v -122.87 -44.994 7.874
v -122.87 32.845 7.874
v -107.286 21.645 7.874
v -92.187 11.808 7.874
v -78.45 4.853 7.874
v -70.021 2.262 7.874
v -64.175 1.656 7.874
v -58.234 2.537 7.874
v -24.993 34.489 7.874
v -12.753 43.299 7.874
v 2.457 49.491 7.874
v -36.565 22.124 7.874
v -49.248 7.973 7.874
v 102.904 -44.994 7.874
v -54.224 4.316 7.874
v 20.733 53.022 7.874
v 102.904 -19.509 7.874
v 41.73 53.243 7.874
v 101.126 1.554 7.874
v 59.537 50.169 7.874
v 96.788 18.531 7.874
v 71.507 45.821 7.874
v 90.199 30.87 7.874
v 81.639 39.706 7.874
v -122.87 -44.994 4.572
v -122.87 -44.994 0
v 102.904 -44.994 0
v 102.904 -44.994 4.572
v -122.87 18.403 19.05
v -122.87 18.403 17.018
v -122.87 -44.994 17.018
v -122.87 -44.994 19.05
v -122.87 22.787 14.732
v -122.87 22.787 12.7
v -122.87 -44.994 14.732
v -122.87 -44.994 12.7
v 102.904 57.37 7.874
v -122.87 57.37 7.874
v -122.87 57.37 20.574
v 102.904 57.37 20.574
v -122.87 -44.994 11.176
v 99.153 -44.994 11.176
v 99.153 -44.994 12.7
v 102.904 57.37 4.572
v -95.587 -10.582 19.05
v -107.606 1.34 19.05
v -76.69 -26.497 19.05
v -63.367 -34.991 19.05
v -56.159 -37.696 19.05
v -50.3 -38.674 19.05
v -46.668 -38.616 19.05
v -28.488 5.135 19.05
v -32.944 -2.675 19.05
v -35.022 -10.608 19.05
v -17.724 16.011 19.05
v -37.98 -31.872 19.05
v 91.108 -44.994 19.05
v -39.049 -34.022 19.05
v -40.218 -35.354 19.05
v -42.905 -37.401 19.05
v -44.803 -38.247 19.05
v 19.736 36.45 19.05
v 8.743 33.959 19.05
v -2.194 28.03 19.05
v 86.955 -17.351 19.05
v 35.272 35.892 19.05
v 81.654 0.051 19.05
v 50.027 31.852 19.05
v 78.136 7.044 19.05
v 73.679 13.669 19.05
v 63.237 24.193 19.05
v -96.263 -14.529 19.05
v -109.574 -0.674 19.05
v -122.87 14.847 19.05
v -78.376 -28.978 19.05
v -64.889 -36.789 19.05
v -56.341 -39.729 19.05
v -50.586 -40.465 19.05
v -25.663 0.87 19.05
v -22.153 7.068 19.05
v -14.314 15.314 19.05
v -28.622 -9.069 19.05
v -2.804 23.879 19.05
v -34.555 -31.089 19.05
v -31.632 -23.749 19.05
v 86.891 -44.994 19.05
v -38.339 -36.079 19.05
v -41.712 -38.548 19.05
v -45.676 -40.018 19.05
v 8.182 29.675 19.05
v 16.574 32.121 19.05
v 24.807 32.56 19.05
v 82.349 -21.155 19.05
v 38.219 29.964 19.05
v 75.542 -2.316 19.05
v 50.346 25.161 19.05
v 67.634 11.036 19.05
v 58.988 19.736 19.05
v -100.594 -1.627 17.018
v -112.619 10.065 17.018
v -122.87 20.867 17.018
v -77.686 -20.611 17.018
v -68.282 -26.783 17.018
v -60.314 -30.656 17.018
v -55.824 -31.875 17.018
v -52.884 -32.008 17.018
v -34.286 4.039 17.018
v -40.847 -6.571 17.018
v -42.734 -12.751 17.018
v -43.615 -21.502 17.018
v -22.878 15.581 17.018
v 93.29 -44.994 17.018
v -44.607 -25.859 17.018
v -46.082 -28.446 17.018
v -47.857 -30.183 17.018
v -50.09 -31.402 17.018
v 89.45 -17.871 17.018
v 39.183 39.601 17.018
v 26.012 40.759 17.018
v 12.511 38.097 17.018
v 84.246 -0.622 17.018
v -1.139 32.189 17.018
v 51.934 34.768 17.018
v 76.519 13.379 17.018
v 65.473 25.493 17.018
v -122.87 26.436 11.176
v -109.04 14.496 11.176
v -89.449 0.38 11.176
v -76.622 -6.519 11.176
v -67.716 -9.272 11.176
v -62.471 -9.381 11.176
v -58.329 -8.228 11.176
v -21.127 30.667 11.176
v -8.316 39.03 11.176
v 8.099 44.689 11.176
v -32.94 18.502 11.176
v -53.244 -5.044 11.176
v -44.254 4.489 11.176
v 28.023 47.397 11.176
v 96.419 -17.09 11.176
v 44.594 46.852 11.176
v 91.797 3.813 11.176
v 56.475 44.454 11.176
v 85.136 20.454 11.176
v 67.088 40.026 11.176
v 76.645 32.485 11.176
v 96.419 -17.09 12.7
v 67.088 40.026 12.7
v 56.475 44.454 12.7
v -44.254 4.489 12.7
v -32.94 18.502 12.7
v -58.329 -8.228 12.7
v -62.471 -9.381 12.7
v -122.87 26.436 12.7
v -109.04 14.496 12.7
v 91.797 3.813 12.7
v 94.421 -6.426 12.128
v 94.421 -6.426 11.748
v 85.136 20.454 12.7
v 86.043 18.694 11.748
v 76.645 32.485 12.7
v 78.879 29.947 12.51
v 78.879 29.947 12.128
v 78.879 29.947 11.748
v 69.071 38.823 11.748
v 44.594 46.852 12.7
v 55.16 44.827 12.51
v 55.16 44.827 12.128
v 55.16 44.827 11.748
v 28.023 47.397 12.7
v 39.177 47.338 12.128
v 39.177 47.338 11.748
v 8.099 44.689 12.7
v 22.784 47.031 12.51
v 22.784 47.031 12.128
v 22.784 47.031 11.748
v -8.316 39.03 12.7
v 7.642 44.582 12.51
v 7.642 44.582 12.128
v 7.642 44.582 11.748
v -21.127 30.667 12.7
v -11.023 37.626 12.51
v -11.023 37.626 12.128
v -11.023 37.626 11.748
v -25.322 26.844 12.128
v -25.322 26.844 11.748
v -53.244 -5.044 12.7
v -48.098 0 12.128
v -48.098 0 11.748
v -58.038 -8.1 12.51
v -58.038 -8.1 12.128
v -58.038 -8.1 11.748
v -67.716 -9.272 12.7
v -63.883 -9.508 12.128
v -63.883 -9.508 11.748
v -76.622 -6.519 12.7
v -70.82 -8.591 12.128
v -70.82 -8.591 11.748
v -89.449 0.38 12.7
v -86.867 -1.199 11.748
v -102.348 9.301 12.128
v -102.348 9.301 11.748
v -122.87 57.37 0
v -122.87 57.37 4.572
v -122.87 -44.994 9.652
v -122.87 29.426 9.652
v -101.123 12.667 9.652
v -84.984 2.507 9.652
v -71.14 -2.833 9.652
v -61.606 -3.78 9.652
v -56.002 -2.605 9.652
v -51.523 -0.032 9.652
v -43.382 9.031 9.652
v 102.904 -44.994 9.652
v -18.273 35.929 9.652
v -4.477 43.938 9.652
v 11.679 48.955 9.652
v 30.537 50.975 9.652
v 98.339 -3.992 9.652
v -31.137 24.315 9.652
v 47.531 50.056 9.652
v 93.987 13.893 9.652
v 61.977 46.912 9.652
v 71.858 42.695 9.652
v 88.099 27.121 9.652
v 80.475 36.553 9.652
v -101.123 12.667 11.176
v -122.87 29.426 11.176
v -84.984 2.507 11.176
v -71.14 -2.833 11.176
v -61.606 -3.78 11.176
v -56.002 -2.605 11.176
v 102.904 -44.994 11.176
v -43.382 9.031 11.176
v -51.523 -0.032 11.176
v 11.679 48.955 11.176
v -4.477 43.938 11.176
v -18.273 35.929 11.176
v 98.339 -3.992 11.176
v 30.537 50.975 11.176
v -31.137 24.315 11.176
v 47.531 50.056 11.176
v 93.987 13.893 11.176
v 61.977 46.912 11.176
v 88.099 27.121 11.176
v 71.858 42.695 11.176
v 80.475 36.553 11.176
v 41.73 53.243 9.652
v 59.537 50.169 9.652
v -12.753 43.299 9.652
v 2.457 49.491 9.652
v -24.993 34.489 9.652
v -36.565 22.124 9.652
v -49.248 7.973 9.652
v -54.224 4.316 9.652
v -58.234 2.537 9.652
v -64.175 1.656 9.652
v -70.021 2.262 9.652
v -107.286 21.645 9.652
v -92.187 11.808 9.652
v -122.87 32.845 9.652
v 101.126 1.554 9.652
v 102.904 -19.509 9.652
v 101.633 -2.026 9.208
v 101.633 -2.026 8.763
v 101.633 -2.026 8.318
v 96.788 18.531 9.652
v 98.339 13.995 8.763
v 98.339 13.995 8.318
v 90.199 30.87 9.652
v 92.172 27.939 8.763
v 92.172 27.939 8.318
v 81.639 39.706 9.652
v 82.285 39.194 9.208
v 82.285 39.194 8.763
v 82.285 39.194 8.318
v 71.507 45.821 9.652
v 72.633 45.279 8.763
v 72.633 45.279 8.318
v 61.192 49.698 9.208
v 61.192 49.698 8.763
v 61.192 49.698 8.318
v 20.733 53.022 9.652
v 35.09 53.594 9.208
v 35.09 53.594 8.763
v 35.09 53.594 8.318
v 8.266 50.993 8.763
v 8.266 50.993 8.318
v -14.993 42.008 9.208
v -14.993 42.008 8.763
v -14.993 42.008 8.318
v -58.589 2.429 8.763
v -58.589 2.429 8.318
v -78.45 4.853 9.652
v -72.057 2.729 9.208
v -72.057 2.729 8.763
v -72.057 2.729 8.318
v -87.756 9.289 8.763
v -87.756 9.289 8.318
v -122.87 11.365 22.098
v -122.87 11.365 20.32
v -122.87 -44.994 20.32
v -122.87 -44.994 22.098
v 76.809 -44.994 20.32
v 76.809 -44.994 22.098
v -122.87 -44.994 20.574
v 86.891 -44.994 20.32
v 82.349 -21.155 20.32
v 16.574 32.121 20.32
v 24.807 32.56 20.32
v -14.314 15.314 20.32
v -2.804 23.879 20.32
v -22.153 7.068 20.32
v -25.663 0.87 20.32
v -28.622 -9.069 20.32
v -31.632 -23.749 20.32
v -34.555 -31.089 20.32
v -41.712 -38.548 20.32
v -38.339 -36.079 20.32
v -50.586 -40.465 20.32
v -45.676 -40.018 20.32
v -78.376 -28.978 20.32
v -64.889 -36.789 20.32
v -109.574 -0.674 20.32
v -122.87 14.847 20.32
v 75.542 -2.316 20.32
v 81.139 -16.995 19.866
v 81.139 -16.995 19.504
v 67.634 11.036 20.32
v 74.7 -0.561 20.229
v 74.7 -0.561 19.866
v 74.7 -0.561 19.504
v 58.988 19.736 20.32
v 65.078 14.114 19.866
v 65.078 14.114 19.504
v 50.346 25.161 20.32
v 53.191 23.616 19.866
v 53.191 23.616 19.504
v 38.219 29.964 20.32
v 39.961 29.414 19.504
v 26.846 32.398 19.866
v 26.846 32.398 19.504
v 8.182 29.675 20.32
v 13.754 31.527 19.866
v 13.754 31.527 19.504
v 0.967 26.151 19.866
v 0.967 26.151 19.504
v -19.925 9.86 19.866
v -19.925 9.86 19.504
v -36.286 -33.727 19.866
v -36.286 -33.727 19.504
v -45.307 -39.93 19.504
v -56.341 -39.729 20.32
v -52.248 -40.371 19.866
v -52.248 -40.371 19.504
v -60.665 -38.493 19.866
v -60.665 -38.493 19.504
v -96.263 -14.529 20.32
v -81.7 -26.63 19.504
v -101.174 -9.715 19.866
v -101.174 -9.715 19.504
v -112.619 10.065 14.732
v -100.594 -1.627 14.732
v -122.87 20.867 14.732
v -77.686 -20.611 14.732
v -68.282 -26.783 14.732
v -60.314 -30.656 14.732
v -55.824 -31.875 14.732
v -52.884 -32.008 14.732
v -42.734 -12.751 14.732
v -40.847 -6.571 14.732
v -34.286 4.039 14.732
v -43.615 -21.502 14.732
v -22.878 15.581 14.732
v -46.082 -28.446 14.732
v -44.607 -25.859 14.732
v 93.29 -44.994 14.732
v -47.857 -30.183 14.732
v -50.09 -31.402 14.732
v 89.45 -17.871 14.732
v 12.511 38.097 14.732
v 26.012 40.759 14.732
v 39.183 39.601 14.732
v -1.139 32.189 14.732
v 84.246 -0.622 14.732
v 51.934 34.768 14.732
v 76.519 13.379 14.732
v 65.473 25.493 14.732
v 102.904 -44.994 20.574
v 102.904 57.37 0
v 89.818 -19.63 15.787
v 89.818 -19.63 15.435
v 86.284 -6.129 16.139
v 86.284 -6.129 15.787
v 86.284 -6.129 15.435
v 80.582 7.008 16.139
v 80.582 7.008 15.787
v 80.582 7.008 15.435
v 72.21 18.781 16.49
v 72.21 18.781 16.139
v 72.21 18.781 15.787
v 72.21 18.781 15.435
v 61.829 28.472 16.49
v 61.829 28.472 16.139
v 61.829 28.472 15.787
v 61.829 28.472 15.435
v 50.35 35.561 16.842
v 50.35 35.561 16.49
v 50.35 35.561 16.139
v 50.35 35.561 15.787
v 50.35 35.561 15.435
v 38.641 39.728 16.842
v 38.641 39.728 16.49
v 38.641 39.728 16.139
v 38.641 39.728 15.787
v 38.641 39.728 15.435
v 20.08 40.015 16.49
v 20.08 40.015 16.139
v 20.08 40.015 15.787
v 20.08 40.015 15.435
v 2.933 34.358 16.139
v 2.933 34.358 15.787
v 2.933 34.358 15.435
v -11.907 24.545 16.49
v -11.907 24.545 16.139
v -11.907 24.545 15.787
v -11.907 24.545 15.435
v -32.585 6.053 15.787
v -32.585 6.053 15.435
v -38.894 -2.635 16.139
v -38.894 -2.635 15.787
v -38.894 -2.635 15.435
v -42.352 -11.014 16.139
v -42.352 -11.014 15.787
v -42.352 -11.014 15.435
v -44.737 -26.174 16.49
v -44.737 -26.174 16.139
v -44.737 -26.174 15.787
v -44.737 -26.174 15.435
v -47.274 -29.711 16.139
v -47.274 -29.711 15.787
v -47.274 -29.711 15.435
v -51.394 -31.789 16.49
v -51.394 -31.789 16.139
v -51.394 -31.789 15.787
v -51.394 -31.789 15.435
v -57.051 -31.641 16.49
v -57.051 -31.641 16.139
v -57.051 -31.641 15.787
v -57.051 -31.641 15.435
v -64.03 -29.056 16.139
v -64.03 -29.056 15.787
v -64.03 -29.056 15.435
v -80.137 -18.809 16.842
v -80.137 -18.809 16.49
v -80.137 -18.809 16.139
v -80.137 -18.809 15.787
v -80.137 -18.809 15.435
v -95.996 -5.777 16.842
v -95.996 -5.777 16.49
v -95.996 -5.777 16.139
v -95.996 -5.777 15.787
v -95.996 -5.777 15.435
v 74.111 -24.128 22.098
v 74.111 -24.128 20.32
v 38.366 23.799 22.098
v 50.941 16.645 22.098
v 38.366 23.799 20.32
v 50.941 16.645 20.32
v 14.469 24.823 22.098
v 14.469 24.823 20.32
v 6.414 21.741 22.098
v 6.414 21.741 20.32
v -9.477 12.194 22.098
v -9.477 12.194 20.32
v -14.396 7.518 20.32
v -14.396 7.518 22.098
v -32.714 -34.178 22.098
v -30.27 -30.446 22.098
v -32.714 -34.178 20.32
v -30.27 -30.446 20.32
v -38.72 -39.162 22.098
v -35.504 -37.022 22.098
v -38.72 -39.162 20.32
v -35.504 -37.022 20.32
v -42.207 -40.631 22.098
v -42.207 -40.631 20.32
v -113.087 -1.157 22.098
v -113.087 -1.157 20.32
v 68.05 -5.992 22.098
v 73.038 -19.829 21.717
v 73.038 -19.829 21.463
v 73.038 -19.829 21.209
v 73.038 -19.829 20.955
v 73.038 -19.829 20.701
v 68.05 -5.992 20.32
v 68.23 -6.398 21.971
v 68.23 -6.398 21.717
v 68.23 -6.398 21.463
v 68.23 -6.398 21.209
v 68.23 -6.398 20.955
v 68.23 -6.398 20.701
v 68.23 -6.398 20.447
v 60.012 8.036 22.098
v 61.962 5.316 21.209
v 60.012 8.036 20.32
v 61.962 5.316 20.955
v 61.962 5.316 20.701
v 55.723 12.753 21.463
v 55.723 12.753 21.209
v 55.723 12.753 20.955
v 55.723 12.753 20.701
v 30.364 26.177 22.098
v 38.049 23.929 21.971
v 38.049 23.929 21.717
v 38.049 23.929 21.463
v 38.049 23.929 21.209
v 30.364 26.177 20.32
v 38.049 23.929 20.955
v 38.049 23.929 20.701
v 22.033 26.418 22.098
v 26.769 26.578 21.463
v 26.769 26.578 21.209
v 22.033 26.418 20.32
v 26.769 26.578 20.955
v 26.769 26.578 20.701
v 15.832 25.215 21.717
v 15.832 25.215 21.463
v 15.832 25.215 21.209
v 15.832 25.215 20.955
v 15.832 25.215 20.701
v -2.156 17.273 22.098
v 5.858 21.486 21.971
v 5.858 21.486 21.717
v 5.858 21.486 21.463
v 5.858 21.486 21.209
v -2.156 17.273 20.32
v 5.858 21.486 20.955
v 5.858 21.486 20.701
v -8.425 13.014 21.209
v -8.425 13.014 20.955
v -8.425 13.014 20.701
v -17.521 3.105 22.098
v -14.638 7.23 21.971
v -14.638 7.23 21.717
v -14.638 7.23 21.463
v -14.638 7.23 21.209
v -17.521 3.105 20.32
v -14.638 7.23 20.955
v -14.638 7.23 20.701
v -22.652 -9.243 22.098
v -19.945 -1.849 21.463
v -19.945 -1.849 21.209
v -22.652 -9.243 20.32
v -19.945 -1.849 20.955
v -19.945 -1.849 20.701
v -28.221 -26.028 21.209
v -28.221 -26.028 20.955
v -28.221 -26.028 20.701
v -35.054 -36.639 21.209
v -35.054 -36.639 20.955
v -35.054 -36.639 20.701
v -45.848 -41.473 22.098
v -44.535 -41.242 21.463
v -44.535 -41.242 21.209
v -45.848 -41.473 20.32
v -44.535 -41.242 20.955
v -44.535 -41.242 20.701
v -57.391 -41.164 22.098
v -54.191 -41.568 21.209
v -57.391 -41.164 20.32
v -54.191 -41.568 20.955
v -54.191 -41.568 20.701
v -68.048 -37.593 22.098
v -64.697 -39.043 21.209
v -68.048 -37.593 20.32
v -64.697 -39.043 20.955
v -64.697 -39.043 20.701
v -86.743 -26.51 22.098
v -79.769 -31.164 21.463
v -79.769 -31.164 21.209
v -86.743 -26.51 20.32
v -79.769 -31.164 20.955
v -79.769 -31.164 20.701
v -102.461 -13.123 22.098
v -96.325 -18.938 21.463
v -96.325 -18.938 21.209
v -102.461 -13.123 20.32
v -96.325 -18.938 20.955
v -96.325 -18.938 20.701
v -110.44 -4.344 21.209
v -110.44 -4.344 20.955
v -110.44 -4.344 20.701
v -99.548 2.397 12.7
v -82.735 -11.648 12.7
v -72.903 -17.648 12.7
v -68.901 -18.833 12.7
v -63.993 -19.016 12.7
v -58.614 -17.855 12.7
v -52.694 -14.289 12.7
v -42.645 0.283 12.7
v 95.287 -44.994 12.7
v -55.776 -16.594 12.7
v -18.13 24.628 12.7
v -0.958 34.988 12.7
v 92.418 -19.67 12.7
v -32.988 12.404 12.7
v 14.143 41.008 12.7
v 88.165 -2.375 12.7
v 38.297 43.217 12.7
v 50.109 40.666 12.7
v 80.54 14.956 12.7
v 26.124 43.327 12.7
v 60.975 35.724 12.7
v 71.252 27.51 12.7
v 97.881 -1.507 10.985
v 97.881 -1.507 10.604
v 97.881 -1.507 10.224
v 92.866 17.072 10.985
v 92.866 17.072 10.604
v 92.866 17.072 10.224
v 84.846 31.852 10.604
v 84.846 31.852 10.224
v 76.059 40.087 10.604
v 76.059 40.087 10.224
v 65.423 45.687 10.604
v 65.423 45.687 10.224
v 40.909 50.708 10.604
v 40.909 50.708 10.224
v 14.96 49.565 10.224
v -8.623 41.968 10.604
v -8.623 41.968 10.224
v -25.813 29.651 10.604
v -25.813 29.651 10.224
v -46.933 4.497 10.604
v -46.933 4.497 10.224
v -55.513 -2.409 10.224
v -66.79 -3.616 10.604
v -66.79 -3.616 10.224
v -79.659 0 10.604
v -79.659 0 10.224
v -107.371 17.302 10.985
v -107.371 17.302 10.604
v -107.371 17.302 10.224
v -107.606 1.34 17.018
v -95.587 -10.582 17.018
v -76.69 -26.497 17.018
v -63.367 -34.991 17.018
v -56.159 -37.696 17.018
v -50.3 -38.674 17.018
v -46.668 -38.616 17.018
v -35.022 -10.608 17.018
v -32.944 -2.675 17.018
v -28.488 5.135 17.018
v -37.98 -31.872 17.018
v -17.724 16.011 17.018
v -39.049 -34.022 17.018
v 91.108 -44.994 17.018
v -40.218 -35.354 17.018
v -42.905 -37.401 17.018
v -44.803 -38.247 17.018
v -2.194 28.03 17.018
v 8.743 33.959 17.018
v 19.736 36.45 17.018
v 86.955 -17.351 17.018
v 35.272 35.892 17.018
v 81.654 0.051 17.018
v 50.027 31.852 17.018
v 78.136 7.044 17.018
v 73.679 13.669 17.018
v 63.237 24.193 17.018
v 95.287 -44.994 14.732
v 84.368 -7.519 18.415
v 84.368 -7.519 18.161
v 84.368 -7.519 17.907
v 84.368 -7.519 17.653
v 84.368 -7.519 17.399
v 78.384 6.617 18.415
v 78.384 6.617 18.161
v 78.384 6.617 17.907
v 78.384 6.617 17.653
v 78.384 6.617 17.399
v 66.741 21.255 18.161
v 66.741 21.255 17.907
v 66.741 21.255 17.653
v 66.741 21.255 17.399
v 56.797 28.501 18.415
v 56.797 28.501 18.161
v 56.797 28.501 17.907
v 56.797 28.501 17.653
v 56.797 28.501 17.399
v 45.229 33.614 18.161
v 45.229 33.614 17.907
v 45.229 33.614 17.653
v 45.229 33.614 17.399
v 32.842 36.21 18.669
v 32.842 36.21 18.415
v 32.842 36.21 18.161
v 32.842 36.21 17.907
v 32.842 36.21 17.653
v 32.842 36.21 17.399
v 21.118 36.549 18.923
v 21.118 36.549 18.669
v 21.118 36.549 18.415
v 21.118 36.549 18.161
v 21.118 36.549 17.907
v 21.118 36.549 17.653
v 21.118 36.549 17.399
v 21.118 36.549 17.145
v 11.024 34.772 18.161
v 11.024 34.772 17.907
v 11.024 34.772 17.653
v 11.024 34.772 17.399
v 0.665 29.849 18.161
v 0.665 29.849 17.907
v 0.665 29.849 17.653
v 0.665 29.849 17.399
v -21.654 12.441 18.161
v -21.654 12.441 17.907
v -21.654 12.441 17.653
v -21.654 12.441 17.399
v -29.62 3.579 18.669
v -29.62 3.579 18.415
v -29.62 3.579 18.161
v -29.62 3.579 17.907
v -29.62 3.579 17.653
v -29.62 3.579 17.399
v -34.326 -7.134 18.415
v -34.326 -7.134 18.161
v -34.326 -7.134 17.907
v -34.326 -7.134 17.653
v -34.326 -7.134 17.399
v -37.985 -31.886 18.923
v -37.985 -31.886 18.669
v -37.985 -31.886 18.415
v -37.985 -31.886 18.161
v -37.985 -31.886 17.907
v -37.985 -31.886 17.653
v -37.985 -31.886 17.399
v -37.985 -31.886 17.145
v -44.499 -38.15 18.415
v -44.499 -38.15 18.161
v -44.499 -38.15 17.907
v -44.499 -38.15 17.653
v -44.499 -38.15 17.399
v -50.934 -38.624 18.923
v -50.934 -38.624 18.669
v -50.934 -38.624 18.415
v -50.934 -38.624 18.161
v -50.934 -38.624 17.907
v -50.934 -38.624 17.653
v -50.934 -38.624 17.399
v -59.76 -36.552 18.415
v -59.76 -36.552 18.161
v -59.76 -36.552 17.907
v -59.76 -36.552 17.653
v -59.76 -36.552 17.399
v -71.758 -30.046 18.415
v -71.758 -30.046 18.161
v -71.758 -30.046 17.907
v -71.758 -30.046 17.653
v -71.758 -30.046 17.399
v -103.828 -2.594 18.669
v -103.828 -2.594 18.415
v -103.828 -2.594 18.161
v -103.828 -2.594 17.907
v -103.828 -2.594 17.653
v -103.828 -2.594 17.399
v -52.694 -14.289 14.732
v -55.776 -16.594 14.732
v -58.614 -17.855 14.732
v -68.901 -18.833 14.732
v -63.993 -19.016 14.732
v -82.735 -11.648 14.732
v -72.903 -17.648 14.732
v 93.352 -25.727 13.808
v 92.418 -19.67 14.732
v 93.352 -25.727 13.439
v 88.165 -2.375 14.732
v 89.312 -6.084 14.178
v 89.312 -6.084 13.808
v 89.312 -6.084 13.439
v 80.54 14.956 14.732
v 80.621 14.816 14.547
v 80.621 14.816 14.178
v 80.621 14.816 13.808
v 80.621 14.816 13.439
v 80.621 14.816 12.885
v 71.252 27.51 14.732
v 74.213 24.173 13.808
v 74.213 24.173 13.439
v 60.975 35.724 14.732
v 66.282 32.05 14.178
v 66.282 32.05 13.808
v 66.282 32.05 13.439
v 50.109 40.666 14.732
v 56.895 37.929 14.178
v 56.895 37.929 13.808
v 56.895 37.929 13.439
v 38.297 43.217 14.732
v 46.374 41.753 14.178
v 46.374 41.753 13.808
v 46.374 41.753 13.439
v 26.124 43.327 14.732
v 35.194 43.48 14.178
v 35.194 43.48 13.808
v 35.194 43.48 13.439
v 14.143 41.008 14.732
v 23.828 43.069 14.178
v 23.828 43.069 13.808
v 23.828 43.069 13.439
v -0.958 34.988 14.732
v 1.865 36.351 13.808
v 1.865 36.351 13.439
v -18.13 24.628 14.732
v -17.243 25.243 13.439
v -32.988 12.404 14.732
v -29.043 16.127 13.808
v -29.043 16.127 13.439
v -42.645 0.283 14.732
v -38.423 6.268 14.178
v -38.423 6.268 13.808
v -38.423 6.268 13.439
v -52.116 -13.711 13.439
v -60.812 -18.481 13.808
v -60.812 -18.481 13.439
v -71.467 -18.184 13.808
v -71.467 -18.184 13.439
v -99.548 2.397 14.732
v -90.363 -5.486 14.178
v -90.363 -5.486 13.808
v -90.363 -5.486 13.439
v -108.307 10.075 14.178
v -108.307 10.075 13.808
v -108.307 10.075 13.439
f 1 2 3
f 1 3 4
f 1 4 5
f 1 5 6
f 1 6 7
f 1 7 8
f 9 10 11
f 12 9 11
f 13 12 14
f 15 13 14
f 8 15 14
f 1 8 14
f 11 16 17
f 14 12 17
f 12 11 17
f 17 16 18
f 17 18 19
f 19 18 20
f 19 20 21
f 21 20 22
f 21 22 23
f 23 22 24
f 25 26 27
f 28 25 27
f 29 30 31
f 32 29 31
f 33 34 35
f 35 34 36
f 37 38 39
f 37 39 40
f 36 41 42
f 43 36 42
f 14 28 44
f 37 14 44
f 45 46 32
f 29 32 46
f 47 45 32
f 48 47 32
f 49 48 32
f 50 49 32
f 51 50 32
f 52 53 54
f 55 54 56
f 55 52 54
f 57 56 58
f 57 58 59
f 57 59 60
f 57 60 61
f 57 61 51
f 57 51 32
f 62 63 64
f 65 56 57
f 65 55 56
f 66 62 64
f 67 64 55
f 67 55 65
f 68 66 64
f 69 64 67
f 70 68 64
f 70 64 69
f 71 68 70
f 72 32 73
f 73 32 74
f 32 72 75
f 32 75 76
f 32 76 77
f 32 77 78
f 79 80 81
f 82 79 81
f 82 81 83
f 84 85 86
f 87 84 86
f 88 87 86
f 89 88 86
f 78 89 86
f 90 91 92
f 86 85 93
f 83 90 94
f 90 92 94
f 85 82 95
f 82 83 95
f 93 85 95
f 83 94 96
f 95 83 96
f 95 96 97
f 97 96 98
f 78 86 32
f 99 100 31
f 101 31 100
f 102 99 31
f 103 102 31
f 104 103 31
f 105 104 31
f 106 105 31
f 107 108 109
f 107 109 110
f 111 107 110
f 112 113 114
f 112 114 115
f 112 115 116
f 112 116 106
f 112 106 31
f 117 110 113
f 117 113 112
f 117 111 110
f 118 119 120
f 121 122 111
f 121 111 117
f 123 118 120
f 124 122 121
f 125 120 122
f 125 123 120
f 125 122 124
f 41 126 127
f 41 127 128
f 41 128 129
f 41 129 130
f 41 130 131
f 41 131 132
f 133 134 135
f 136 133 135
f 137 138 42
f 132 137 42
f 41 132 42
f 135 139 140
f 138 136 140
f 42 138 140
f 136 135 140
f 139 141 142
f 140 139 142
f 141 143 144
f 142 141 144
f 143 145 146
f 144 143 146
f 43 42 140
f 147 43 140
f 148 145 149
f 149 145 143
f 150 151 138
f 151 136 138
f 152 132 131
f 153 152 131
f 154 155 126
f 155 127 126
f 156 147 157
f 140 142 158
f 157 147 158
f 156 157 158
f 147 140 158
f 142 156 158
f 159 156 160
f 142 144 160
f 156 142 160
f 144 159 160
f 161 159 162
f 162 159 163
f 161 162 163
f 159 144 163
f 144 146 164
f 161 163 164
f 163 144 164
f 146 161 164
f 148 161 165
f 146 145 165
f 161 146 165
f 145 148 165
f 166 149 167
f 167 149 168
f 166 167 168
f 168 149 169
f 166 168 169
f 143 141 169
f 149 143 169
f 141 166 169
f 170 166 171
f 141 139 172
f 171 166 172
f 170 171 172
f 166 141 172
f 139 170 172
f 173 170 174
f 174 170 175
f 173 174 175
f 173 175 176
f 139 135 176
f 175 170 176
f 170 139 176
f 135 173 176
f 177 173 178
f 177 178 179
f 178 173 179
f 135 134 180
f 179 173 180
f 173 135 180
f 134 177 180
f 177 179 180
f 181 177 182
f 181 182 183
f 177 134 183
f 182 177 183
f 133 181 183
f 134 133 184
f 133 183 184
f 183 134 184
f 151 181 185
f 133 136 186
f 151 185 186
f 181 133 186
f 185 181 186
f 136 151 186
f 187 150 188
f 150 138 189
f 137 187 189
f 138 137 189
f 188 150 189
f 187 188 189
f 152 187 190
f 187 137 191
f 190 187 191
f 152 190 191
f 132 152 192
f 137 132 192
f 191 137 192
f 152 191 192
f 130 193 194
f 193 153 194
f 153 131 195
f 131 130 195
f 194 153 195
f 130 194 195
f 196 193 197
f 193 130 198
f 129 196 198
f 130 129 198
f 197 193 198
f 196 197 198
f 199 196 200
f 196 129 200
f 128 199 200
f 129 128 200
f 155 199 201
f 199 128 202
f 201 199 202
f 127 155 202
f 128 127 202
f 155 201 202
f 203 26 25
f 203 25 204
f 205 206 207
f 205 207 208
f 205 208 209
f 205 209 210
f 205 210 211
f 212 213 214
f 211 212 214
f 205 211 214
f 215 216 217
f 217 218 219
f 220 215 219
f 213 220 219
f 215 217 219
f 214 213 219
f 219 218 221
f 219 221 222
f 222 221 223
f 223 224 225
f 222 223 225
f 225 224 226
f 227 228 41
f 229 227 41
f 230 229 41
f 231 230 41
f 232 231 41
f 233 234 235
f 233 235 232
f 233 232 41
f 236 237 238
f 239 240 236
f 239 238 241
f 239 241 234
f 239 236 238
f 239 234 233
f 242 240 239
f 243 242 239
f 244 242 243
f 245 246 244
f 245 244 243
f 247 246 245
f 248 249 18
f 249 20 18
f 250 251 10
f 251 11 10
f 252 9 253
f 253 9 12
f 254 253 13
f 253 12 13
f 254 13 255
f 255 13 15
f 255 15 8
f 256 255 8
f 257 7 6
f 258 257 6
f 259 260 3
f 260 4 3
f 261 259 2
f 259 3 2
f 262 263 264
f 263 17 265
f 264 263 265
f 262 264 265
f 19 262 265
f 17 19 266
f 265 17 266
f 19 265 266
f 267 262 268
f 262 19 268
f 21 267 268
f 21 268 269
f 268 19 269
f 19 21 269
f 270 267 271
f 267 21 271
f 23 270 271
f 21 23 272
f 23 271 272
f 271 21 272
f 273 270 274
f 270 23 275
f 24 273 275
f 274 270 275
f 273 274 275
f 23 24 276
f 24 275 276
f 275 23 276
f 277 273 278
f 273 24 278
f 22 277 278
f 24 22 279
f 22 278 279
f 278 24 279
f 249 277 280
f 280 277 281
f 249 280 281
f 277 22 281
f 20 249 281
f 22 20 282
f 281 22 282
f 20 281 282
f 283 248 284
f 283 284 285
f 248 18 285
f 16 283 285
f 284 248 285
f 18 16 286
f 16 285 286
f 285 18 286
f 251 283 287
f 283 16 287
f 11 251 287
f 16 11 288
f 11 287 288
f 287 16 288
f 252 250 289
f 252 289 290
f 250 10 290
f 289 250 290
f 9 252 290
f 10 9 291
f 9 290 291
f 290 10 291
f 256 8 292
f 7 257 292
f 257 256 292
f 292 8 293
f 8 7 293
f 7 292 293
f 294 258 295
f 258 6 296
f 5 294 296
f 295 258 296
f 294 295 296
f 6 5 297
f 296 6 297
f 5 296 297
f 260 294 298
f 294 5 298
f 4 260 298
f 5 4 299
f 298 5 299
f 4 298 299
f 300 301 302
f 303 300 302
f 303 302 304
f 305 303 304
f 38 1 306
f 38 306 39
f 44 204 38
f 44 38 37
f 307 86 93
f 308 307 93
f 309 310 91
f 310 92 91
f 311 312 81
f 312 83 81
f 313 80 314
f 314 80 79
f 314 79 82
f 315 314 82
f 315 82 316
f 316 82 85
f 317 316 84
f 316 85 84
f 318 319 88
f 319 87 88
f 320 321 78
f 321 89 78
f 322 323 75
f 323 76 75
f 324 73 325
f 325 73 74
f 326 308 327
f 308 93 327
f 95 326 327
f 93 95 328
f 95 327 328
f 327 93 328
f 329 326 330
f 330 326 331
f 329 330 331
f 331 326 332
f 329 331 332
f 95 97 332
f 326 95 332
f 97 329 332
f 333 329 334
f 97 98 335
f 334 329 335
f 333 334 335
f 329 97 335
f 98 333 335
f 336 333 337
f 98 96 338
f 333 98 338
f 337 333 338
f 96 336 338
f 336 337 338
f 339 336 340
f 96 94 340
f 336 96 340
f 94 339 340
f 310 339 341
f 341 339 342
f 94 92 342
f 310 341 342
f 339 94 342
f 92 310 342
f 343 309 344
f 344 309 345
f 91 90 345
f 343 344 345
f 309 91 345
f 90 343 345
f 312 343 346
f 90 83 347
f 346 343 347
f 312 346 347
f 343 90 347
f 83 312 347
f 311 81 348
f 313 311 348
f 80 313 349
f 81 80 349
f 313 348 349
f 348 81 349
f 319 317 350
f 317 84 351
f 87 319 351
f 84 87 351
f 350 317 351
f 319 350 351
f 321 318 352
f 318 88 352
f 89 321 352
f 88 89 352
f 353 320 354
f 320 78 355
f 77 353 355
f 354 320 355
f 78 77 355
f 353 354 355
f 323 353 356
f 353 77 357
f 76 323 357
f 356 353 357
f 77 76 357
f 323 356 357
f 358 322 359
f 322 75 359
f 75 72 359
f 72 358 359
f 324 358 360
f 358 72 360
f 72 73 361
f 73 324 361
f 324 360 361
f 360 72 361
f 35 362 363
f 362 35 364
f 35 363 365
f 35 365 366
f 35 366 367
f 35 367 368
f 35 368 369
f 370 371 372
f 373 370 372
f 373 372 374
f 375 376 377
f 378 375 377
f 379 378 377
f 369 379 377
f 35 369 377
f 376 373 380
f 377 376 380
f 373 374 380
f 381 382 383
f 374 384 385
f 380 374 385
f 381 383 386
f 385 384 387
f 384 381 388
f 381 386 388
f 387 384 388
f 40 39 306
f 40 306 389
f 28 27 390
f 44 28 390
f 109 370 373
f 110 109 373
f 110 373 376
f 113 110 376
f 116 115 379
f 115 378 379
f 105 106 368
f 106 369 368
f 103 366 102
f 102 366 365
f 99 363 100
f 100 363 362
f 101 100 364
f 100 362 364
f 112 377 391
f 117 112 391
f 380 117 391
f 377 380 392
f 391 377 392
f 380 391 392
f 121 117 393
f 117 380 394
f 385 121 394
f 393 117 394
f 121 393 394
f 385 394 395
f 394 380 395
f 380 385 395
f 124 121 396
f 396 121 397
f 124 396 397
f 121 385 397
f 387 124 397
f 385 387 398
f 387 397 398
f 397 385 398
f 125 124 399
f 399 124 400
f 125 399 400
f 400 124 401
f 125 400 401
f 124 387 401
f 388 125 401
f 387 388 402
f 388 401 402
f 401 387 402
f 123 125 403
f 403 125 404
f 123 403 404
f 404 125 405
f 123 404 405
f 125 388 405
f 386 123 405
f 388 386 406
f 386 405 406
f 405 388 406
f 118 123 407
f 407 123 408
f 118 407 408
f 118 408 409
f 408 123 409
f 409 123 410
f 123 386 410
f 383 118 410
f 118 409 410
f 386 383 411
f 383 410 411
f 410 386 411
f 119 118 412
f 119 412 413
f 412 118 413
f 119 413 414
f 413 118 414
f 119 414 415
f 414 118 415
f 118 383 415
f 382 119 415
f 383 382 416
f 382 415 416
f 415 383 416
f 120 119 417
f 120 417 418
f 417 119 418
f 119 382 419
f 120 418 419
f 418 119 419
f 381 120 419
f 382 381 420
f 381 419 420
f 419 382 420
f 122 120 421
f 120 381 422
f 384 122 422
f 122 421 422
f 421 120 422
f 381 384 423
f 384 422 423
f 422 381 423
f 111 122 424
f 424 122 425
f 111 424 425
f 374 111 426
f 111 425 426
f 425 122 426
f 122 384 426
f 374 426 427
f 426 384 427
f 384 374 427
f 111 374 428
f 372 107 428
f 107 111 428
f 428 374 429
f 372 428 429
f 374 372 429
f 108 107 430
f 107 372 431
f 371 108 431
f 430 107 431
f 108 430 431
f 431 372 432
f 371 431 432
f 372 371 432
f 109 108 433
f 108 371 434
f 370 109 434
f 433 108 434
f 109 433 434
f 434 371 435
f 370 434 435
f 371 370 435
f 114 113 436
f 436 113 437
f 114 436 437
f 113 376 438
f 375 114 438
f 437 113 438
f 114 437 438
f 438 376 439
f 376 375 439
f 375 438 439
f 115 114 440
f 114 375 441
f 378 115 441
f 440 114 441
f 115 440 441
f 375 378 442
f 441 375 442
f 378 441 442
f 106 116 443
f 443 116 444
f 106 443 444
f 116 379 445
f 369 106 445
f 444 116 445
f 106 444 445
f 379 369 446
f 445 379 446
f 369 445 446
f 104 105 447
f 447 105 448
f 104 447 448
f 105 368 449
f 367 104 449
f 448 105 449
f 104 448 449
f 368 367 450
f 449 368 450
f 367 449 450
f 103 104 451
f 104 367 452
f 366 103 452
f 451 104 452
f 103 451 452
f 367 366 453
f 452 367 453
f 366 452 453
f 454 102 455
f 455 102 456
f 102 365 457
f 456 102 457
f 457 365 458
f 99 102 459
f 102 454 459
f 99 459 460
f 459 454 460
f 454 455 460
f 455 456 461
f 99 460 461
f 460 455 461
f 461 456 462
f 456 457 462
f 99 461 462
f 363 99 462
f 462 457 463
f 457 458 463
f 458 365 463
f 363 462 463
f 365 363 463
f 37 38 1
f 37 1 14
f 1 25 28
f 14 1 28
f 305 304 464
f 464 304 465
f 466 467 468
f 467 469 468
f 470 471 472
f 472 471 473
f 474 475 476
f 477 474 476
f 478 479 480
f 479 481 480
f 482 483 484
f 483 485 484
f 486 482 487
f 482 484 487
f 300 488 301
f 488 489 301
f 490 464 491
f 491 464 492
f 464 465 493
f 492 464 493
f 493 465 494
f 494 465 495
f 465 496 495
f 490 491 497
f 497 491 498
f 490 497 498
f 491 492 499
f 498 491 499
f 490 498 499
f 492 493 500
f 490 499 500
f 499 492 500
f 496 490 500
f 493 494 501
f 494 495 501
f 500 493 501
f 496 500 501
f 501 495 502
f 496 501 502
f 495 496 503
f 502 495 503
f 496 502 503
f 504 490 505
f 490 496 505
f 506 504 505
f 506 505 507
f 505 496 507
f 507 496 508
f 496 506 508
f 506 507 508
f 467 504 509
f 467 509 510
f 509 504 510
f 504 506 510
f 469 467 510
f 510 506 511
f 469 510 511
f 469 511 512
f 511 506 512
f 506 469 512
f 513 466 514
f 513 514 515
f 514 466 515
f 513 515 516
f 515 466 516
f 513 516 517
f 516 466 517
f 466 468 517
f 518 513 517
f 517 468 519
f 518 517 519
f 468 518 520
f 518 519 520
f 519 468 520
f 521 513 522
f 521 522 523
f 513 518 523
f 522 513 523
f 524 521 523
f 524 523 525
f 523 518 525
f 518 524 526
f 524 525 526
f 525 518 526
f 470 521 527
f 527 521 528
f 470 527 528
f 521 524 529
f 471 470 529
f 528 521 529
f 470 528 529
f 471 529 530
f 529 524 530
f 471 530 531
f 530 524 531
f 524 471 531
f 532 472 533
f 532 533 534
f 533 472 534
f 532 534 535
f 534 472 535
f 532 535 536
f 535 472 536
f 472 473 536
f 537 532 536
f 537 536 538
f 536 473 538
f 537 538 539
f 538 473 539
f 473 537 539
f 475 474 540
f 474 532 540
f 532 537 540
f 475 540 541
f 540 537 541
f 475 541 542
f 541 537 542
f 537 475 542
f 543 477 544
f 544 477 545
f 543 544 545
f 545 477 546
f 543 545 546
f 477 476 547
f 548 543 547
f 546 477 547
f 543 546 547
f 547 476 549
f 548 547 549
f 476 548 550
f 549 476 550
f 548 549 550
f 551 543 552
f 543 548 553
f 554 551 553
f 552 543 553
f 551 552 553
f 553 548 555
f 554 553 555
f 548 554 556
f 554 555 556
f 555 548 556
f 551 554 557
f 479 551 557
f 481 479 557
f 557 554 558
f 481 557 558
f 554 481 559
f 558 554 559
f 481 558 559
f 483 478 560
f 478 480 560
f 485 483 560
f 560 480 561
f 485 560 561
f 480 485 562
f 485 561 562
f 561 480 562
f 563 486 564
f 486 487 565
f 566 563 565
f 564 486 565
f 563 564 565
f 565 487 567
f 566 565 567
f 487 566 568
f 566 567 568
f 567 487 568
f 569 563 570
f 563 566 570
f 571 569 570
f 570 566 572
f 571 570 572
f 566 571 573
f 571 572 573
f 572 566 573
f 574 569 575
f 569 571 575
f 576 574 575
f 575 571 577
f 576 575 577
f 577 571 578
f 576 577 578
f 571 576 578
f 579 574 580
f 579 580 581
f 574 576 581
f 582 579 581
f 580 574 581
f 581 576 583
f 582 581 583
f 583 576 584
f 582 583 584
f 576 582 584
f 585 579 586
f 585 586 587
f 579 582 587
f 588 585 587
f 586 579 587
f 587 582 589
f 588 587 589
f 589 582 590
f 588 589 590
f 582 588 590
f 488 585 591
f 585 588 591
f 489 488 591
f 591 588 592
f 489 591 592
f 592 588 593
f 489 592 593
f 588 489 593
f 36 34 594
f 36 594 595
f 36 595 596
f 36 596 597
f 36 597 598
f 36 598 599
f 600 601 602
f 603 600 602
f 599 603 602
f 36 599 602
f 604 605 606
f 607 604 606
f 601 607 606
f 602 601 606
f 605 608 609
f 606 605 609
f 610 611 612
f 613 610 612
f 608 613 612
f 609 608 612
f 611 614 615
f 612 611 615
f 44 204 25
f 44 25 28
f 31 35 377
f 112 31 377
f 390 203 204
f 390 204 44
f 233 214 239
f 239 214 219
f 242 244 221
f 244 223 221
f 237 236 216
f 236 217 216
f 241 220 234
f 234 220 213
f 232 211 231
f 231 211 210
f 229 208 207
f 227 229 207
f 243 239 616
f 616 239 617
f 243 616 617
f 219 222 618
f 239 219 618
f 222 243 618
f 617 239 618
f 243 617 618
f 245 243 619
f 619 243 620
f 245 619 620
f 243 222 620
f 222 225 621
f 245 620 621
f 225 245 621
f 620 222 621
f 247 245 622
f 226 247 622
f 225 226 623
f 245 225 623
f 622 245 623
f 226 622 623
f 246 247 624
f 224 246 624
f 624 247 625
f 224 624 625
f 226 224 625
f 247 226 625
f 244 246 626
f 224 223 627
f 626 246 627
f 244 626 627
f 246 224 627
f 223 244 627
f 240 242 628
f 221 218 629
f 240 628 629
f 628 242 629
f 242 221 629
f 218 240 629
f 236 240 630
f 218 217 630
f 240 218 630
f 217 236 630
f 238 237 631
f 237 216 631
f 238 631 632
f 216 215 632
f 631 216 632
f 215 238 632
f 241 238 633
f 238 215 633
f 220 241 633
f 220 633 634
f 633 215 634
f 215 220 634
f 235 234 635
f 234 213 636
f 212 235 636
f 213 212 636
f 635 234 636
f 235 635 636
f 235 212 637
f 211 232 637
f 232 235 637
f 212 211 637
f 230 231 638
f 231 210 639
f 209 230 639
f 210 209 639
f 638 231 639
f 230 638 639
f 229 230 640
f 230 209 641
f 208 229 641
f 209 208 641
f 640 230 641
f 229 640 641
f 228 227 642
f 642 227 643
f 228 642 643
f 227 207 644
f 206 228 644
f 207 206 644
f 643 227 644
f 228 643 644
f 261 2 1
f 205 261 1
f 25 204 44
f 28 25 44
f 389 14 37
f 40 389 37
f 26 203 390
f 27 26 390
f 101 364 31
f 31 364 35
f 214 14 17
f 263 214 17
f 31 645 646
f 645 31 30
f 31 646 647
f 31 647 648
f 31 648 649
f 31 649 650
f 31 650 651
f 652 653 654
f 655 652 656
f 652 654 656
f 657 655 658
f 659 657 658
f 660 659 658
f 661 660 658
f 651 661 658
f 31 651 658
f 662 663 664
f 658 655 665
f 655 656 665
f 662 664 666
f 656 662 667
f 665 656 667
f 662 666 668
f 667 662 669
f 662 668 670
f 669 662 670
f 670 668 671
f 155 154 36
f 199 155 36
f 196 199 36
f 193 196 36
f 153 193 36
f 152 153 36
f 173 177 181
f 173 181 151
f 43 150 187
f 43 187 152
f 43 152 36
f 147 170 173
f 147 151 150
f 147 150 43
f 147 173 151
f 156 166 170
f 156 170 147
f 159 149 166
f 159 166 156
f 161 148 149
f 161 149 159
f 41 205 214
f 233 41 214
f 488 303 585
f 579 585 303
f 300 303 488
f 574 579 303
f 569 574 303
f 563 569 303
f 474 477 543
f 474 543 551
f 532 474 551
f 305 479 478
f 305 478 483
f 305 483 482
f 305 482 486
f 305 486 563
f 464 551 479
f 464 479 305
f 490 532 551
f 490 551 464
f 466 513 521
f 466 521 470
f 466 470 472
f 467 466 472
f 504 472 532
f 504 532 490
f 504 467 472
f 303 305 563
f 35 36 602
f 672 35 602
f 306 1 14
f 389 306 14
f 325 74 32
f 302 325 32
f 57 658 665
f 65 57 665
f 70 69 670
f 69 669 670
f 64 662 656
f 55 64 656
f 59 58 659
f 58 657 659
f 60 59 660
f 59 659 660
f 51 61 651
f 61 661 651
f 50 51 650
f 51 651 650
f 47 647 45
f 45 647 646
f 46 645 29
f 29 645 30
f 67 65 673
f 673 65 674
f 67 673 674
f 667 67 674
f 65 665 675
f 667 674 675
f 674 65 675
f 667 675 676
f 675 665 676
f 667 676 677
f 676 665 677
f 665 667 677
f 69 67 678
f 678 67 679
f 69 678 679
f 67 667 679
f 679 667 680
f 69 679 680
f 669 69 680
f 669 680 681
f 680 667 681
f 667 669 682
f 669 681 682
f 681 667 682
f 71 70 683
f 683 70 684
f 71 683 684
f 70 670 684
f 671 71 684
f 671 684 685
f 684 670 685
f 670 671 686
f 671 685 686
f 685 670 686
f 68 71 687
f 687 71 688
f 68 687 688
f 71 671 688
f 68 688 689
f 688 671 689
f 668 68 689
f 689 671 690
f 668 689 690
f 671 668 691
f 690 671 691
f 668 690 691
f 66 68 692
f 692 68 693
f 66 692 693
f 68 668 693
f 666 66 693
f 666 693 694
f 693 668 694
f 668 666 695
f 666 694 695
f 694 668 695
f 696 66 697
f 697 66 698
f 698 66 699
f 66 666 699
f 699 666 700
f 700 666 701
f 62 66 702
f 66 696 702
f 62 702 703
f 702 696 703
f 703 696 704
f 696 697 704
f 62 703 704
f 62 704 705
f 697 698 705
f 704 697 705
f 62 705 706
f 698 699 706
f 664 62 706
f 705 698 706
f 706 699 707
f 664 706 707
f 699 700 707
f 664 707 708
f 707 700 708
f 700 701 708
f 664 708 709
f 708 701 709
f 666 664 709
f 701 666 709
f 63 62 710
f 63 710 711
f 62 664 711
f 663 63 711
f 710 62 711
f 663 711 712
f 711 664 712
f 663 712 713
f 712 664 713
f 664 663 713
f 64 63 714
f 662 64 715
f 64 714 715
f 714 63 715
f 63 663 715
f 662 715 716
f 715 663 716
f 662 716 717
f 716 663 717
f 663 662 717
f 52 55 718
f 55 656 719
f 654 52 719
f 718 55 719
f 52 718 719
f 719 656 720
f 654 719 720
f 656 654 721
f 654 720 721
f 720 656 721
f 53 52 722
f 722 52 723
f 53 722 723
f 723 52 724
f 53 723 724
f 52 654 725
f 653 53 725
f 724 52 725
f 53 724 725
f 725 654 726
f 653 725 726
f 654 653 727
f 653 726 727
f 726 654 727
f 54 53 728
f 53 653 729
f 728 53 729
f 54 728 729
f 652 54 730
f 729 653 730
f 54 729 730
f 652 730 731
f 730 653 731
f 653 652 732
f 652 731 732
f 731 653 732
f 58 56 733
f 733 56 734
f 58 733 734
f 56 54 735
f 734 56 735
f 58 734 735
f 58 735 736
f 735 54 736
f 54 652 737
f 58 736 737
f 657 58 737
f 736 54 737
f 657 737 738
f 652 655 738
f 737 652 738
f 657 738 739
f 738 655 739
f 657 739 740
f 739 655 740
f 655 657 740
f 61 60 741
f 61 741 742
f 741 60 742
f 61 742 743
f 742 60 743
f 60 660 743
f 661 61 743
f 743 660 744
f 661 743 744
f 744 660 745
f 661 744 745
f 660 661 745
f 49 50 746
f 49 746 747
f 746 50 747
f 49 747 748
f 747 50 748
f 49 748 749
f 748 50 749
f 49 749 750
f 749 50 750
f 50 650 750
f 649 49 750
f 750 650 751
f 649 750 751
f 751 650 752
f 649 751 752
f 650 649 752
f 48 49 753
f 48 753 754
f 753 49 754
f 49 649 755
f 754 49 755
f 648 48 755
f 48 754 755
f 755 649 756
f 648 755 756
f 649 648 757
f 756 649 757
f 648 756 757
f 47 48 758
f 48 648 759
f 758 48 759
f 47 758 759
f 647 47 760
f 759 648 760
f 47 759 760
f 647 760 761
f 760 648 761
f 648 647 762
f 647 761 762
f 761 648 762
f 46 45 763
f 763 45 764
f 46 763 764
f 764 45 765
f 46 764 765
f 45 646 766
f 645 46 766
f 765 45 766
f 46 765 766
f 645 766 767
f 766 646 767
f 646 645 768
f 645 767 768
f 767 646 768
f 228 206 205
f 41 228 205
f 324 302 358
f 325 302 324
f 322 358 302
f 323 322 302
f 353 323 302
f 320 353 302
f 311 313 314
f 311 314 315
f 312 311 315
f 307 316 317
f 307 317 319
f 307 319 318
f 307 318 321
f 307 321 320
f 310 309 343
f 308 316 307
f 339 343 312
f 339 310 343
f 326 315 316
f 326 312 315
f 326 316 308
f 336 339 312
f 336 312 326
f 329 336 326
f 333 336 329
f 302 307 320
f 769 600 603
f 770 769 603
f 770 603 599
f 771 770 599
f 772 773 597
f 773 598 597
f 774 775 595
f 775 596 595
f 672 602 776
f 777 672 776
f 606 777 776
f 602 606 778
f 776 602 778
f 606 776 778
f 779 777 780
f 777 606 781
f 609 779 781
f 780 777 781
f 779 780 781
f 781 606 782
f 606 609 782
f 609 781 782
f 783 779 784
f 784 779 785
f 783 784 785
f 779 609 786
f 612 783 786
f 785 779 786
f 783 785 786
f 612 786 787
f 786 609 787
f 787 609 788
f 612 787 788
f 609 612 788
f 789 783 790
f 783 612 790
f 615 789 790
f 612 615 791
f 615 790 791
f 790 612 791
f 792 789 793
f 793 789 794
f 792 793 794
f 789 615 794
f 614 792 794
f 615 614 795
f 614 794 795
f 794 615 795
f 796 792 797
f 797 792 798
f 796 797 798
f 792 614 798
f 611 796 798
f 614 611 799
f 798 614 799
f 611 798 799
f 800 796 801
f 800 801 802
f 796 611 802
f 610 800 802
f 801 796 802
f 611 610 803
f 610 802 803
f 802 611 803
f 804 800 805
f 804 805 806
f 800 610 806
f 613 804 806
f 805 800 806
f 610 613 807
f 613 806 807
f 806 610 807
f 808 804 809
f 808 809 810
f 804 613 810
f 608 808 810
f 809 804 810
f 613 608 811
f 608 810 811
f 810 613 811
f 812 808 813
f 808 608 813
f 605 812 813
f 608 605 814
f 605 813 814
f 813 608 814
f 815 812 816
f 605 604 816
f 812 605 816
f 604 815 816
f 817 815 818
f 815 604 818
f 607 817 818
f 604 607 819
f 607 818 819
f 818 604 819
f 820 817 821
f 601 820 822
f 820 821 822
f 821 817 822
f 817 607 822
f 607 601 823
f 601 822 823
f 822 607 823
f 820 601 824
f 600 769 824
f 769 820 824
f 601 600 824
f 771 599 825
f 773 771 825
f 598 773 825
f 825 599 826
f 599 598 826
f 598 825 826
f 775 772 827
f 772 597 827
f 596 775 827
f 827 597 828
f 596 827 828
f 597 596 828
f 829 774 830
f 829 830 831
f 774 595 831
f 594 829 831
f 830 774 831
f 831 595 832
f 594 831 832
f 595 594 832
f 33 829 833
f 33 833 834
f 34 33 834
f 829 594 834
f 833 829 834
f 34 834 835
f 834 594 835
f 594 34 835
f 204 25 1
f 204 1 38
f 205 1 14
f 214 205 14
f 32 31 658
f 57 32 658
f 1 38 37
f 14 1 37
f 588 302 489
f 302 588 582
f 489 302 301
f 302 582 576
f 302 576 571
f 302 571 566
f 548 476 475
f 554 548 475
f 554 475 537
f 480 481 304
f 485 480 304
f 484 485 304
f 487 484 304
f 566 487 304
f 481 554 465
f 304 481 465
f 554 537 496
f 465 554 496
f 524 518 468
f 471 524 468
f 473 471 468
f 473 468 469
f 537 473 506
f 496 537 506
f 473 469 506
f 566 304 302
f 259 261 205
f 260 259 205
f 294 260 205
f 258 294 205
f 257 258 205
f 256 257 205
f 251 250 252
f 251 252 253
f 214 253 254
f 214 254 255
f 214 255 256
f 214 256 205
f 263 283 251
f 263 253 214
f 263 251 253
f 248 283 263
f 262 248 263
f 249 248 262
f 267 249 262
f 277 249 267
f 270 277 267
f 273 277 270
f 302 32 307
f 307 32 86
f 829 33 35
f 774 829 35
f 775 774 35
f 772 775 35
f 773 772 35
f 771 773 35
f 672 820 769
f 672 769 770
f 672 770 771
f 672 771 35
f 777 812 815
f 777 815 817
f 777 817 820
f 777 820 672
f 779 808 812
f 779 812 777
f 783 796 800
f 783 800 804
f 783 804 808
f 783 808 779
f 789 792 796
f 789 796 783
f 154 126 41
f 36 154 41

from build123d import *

# Parameters (mm, degrees)
F0_W      = 225.7743701339
F0_H      = 102.3639403284
F1_DEPTH  = 4.572
F2_DEPTH  = 3.302
F4_DEPTH  = 1.778
F6_DEPTH  = 1.524
F8_DEPTH  = 1.524
F10_DEPTH = 2.032
F12_DEPTH = 2.286
F14_DEPTH = 2.032
F16_DEPTH = 1.27
F18_DEPTH = 1.778
F19_DEPTH = 12.7


with BuildPart() as f1:
    # F0 (on Top) → F1 (new body)
    with BuildSketch(Plane.XY):
        with Locations((-9.9827311933, 6.1877723783)):
            Rectangle(F0_W, F0_H)
    extrude(amount=F1_DEPTH)


with BuildPart() as f2:
    # F2 (new): a face of the model
    f2_faces = [f1.part.faces().sort_by_distance(p)[0] for p in [
        (-9.9827311933, 6.1877723783, 4.572),
    ]]
    extrude(f2_faces, amount=F2_DEPTH)


with BuildPart() as f4:
    # F3 (on face) → F4 (new body)
    with BuildSketch(Plane.XY.offset(7.874)):
        with BuildLine():
            Line((-122.8699162602, -44.9941977859), (102.9044538736, -44.9941977859))
            Line((102.9044538736, -44.9941977859), (102.9044538736, -19.5089115048))
            add(Edge.make_bspline(
                [(102.9044538736, -19.5089115048), (102.1812480597, 4.5045019065), (92.8236790882, 57.2765409067), (-25.3444978127, 58.614254318), (-52.8263507974, -18.2499830344), (-98.7995831296, 15.2861642389), (-122.8699162602, 32.8447781503)],
                knots=[0.0678652066, 0.0678652066, 0.0678652066, 0.0678652066, 0.2638789744, 0.5434886666, 0.7609830913, 1, 1, 1, 1], degree=3))
            Line((-122.8699162602, 32.8447781503), (-122.8699162602, -44.9941977859))
        make_face()
    extrude(amount=F4_DEPTH)


with BuildPart() as f6:
    # F5 (on face) → F6 (new body)
    with BuildSketch(Plane.XY.offset(9.652)):
        with BuildLine():
            Line((-122.8699162602, -44.9941977859), (102.9044538736, -44.9941977859))
            add(Edge.make_bspline(
                [(102.9044538736, -44.9941977859), (100.4457821585, -14.8774043592), (96.0736205313, 38.6781344883), (40.7973204242, 54.4030015041), (-10.3044880764, 47.0727645172), (-39.2026420291, 16.6614174954), (-53.157598453, -6.6909166581), (-81.266488115, -1.9259286723), (-107.2706394158, 16.9885983691), (-118.1263369768, 25.6437893446), (-122.8699162602, 29.4258203357)],
                knots=[0, 0, 0, 0, 0.1804361375, 0.3208626641, 0.464890854, 0.5943028599, 0.6936237202, 0.7938357508, 0.9099130704, 1, 1, 1, 1], degree=3))
            Line((-122.8699162602, 29.4258203357), (-122.8699162602, -44.9941977859))
        make_face()
    extrude(amount=F6_DEPTH)


with BuildPart() as f8:
    # F7 (on face) → F8 (new body)
    with BuildSketch(Plane.XY.offset(11.176)):
        with BuildLine():
            Line((-122.8699162602, -44.9941977859), (99.1531535983, -44.9941977859))
            add(Edge.make_bspline(
                [(99.1531535983, -44.9941977859), (98.3462873382, -32.8099007124), (96.6072127286, -6.5485452393), (76.8376882373, 49.8992602273), (5.7046126193, 48.6003790216), (-26.1334547846, 29.7454987309), (-46.6776533703, -0.4204880214), (-65.6622424164, -15.8243684106), (-103.7801961143, 9.2700030071), (-116.9783376211, 21.1378968754), (-122.8699162602, 26.4356601983)],
                knots=[0, 0, 0, 0, 0.126175063, 0.2719507052, 0.4309423817, 0.5547838207, 0.6748832042, 0.7655452181, 0.8953406596, 1, 1, 1, 1], degree=3))
            Line((-122.8699162602, 26.4356601983), (-122.8699162602, -44.9941977859))
        make_face()
    extrude(amount=F8_DEPTH)


with BuildPart() as f10:
    # F9 (on face) → F10 (new body)
    with BuildSketch(Plane.XY.offset(12.7)):
        with BuildLine():
            Line((-122.8699162602, -44.9941977859), (95.2871143818, -44.9941977859))
            add(Edge.make_bspline(
                [(95.2871143818, -44.9941977859), (94.230633051, -32.1910754819), (92.0502690594, -5.7680180775), (70.6944387756, 37.3906945191), (22.8924405273, 48.9204848198), (-17.7564680323, 26.5424362635), (-40.3098158111, 6.823144713), (-50.5798049536, -14.5796887352), (-60.3420585569, -18.9390870067), (-72.6353135009, -19.9494157758), (-90.5346519754, -5.6050874071), (-108.0914940406, 9.9243516189), (-118.1356945889, 18.6663468796), (-122.8699162602, 22.7867886424)],
                knots=[0, 0, 0, 0, 0.1101913973, 0.2274127785, 0.3437239306, 0.4612399009, 0.5583576504, 0.6408177315, 0.6952335429, 0.7534231844, 0.8361786978, 0.9227846601, 1, 1, 1, 1], degree=3))
            Line((-122.8699162602, 22.7867886424), (-122.8699162602, -44.9941977859))
        make_face()
    extrude(amount=F10_DEPTH)


with BuildPart() as f12:
    # F11 (on face) → F12 (new body)
    with BuildSketch(Plane.XY.offset(14.732)):
        with BuildLine():
            Line((-122.8699162602, -44.9941977859), (93.2903140783, -44.9941977859))
            add(Edge.make_bspline(
                [(93.2903140783, -44.9941977859), (92.4922366, -37.1476258303), (90.8148396883, -20.6557238231), (82.6895303539, 8.1813289049), (62.1202602641, 30.5550976504), (39.1969981915, 41.202606034), (20.1499390603, 41.1531335199), (2.2434991578, 34.6004972424), (-7.5130665737, 28.1360225249), (-34.3120085152, 7.3000712942), (-44.280336081, -11.855147704), (-42.6357763632, -26.7425411619), (-56.5243145658, -37.9849299587), (-98.6590515699, -5.0410408762), (-115.1521065603, 12.6080069404), (-122.8699162602, 20.8667553961)],
                knots=[0, 0, 0, 0, 0.077702553, 0.1633149989, 0.2494935267, 0.3273535658, 0.3957556638, 0.4622495003, 0.5174212946, 0.6083672541, 0.6816127701, 0.7391959018, 0.7927527033, 0.9030200774, 1, 1, 1, 1], degree=3))
            Line((-122.8699162602, 20.8667553961), (-122.8699162602, -44.9941977859))
        make_face()
    extrude(amount=F12_DEPTH)


with BuildPart() as f14:
    # F13 (on face) → F14 (new body)
    with BuildSketch(Plane.XY.offset(17.018)):
        with BuildLine():
            Line((-122.8699162602, -44.9941977859), (91.1082550883, -44.9941977859))
            add(Edge.make_bspline(
                [(91.1082550883, -44.9941977859), (90.1666350737, -37.1605463655), (88.4469822688, -22.8541802857), (84.6350548682, -7.4981954526), (79.7234976273, 5.7205284578), (67.5330194837, 22.7822223557), (45.7849410542, 35.4287956259), (20.7529404056, 37.6373923869), (3.1514895376, 33.2378809389), (-22.7449954943, 12.6294423797), (-36.5457150796, -3.6829242816), (-36.0441219029, -32.1155276801), (-41.2805215066, -36.2491560078), (-45.3831391339, -39.3881410702), (-61.7924264411, -38.1014300393), (-84.2919784988, -20.9426246528), (-104.1205073866, -3.0800471644), (-116.5826678738, 11.199184104), (-122.8699162602, 18.4031575918)],
                knots=[0, 0, 0, 0, 0.0673186426, 0.1229420475, 0.17532902, 0.2390934623, 0.3099229356, 0.3792383967, 0.4393323177, 0.5191309405, 0.586117324, 0.6581744592, 0.6914872783, 0.7211779238, 0.7752748257, 0.8507437028, 0.9246991391, 1, 1, 1, 1], degree=3))
            Line((-122.8699162602, 18.4031575918), (-122.8699162602, -44.9941977859))
        make_face()
    extrude(amount=F14_DEPTH)


with BuildPart() as f16:
    # F15 (on face) → F16 (new body)
    with BuildSketch(Plane.XY.offset(19.05)):
        with BuildLine():
            Line((-122.8699162602, -44.9941977859), (86.8907794356, -44.9941977859))
            add(Edge.make_bspline(
                [(86.8907794356, -44.9941977859), (85.8020963771, -37.2910272725), (83.3661533878, -20.0550796201), (68.4910682008, 17.2489691054), (39.0827247662, 31.1270833191), (13.3116135569, 34.9603186092), (-13.3090951214, 17.4578379962), (-28.1355729496, 1.8292398493), (-30.454441934, -23.8765198716), (-35.7647109277, -33.6573939225), (-40.4846303572, -38.3354422119), (-47.791857355, -41.1791668666), (-61.7779634925, -39.4757791326), (-82.0187020894, -27.3035351106), (-101.8899049096, -10.0916177475), (-115.6394877139, 6.252442159), (-122.8699162602, 14.8472161964)],
                knots=[0, 0, 0, 0, 0.0775122101, 0.1734346129, 0.2594317537, 0.3364728531, 0.4212553437, 0.49322341, 0.5700701894, 0.620772085, 0.6589590093, 0.7004365756, 0.7569061944, 0.8315885559, 0.9114382647, 1, 1, 1, 1], degree=3))
            Line((-122.8699162602, 14.8472161964), (-122.8699162602, -44.9941977859))
        make_face()
    extrude(amount=F16_DEPTH)


with BuildPart() as f18:
    # F17 (on face) → F18 (new body)
    with BuildSketch(Plane.XY.offset(20.32)):
        with BuildLine():
            Line((-122.8699162602, -44.9941977859), (76.8093317747, -44.9941977859))
            add(Edge.make_bspline(
                [(76.8093317747, -44.9941977859), (76.1899295315, -37.2040474061), (74.8995818274, -20.975493557), (63.1404192524, 6.3582181477), (50.1309047229, 18.2795927319), (27.0371637019, 30.4297238736), (3.338018857, 20.8972702011), (-8.6854168055, 13.3080260402), (-20.3147793434, 2.7098082623), (-26.9213370581, -26.3419872733), (-34.6748919665, -37.6821695408), (-44.3937249552, -41.8982382847), (-54.1622178305, -41.8143929756), (-65.8469017694, -39.9072973895), (-98.2610902143, -20.8289398151), (-114.4599769931, 0.362581451), (-122.8699162602, 11.3645354286)],
                knots=[0, 0, 0, 0, 0.0783256923, 0.163169214, 0.2300585549, 0.3081478403, 0.3860708494, 0.4454415776, 0.5070634715, 0.5931238889, 0.6513861144, 0.7007684388, 0.7488420823, 0.8021853835, 0.8973010347, 1, 1, 1, 1], degree=3))
            Line((-122.8699162602, 11.3645354286), (-122.8699162602, -44.9941977859))
        make_face()
    extrude(amount=F18_DEPTH)


with BuildPart() as f19:
    # F19 (new): a face of the model
    f19_faces = [f2.part.faces().sort_by_distance(p)[0] for p in [
        (-9.9827311933, 6.1877723783, 7.874),
    ]]
    extrude(f19_faces, amount=F19_DEPTH)


solid = Compound([f1.part, f2.part, f4.part, f6.part, f8.part, f10.part, f12.part, f14.part, f16.part, f18.part, f19.part])
